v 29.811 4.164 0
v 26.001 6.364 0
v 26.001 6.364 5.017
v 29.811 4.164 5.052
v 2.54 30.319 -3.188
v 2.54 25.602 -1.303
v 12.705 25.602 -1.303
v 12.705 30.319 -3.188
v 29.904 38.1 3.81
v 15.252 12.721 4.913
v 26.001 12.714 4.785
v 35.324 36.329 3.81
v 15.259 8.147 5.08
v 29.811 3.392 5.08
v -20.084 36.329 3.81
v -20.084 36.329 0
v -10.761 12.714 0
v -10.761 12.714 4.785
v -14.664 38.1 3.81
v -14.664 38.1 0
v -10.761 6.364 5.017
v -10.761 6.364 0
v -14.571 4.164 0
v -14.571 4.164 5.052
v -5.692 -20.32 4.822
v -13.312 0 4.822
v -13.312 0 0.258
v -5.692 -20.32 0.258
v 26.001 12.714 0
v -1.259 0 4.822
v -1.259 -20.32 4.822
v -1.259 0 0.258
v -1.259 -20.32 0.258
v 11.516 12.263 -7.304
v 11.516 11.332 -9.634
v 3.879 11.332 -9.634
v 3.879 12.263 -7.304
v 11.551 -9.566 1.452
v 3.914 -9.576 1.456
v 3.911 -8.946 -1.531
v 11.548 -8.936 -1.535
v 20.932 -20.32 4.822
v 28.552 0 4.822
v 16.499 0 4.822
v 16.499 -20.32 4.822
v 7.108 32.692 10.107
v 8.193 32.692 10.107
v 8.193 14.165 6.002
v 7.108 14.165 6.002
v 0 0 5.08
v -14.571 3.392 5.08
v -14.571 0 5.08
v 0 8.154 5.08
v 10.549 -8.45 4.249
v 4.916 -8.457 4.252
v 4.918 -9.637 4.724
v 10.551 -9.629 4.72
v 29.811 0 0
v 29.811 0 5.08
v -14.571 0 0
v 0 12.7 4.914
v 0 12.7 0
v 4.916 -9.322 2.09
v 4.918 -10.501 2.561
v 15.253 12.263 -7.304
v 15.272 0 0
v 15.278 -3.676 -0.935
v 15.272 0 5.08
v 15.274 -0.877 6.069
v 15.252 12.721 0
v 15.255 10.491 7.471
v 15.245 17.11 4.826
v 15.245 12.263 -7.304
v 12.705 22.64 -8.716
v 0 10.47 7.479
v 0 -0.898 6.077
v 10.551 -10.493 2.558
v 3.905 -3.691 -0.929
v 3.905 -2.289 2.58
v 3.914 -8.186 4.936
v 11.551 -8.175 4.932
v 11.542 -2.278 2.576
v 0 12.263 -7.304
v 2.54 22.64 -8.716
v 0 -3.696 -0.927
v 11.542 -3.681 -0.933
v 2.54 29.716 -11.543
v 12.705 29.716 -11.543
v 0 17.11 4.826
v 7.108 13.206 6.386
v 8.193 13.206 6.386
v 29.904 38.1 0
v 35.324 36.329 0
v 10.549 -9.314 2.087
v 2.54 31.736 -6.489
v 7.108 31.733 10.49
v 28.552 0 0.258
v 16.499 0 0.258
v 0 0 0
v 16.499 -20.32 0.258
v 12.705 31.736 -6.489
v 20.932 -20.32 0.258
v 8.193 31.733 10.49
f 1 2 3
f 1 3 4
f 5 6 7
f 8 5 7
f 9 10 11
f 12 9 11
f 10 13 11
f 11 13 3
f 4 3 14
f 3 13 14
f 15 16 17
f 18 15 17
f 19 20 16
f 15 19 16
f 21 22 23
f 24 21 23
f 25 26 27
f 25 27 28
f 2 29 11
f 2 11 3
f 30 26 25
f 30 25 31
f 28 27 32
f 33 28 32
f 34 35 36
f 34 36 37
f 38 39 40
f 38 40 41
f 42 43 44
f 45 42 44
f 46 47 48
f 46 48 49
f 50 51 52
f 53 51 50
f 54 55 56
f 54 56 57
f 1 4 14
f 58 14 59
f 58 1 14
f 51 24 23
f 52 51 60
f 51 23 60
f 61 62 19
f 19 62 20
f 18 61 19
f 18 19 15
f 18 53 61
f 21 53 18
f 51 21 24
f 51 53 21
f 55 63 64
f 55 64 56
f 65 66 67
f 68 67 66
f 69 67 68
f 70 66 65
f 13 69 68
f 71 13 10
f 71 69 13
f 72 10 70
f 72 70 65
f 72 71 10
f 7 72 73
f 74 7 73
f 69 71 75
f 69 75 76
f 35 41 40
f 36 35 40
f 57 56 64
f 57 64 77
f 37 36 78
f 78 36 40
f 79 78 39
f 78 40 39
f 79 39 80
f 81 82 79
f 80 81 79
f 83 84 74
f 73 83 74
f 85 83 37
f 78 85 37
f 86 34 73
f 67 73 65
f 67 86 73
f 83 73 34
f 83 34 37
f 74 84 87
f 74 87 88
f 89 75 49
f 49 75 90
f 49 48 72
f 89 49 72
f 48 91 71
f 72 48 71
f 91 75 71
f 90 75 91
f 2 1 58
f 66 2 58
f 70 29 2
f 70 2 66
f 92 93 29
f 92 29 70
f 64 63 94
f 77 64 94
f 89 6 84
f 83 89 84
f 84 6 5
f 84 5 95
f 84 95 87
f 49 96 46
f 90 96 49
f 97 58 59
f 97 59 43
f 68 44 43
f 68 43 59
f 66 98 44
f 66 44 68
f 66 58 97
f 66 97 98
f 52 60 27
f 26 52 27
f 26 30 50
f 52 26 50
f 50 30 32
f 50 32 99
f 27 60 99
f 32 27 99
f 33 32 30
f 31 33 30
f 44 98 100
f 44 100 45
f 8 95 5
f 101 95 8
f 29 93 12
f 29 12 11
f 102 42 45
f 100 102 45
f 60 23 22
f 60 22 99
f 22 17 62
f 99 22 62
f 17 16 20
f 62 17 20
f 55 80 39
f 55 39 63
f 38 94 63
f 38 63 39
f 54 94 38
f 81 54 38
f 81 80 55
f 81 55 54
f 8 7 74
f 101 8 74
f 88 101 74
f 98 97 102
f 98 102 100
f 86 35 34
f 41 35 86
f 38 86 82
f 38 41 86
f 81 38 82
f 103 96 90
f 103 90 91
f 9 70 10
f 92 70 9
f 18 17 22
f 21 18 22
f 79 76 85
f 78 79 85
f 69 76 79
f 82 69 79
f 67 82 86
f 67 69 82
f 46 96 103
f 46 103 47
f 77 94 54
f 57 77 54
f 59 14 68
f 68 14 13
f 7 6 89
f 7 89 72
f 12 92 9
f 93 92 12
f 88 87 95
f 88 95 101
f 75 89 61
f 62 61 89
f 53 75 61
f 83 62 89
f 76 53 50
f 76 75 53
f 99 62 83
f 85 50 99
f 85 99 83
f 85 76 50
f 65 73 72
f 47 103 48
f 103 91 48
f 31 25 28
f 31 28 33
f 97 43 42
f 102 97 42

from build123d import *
from OCP.BRepFilletAPI import BRepFilletAPI_MakeChamfer

# Parameters (mm, degrees)
BOSS_EXTRUDE1_DEPTH  = 5.08
CHAMFER5_SIZE        = 1.27
CHAMFER5_SIZE2       = 33.019999999999996
SKETCH6_W            = 12.052934308980802
SKETCH6_H            = 4.563994413231876
BOSS_EXTRUDE2_DEPTH  = 20.32
CHAMFER6_SIZE        = 20.32
CHAMFER6_SIZE_2      = 7.62
BOSS_EXTRUDE5_DEPTH  = 19.05
CUT_EXTRUDE4_DEPTH   = 15.494
CUT_EXTRUDE5_DEPTH   = 15.494
CUT_EXTRUDE6_DEPTH   = 15.494
CUT_EXTRUDE7_DEPTH   = 15.494
CHAMFER7_SIZE        = 25.4
CHAMFER7_SIZE_2      = 13.97
CUT_EXTRUDE9_DEPTH   = 15.494
BOSS_EXTRUDE7_DEPTH  = 6.35
SKETCH24_W           = 3.7386650704626128
SKETCH24_H           = 3.778783012789209
SKETCH24_W_2         = 3.9045544155871448
SKETCH24_H_2         = 3.7787830127892117
CUT_EXTRUDE11_DEPTH  = 19.05
CHAMFER9_SIZE        = 2.54
CHAMFER9_SIZE2       = 3.8099999999999996
SKETCH26_W           = 23.370745721099873
SKETCH26_H           = 31.500943766528344
CUT_EXTRUDE14_DEPTH  = 1.2699999999999978
SKETCH27_W           = 5.63305406156012
SKETCH27_H           = 2.3288196199824216
BOSS_EXTRUDE9_DEPTH  = 1.2699999999999978
SKETCH30_W           = 1.0845533410304151
SKETCH30_H           = 1.0329414918412994
SKETCH34_W           = 15.244980385835458
SKETCH34_H           = 13.062490152383763
BOSS_EXTRUDE14_DEPTH = 10.16
CHAMFER11_SIZE       = 2.54
CHAMFER11_SIZE_2     = 10.16
SKETCH38_W           = 10.164980385835456
SKETCH38_H           = 7.9824901523837575
BOSS_EXTRUDE15_DEPTH = 7.62
CHAMFER12_SIZE       = 2.54


# Some blends are built 0.0001 mm under size
with BuildPart() as part:
    # Sketch4 → Boss-Extrude1 (new body)
    with BuildSketch(Plane.XY):
        Polygon((0, 0), (0, 12.7), (-14.664448494293428, 38.099999999999994), (-20.084228903343057, 36.328898401943476), (-10.761091691630092, 12.71368779454834), (-10.761091691630092, 6.3636877945483405), (-14.57109169163009, 4.164020520404326), (-14.57109169163009, 0), align=None)
    extrude(amount=BOSS_EXTRUDE1_DEPTH)

    # Chamfer5
    chamfer5_edges = [part.edges().sort_by_distance(p)[0] for p in [
        (-17.374338698818242, 37.214449200971735, 5.08),
    ]]
    chamfer5_side = [part.faces().sort_by_distance(p)[0] for p in [
        (-17.374338698818242, 37.214449200971735, 2.54),
    ]]
    chamfer(chamfer5_edges, length=CHAMFER5_SIZE, length2=CHAMFER5_SIZE2, reference=chamfer5_side[0])

    # Sketch6 → Boss-Extrude2 (add)
    with BuildSketch(Plane.XZ):
        with Locations((-7.2855458458150455, 2.54)):
            Rectangle(SKETCH6_W, SKETCH6_H)
    extrude(amount=BOSS_EXTRUDE2_DEPTH)

    # Chamfer6
    # the kernel refuses this chamfer: 20.32, 7.62 mm, written as the material it takes off along each edge
    with BuildSketch(Plane(origin=(-13.312013000305447, -20.32, 57.52944740394708), x_dir=(-0.013536660009854505, 0.9999083752203387, 0), z_dir=(0, 0, -1))) as chamfer6_piece_1_section:
        Polygon((CHAMFER6_SIZE * 0.99990837522, CHAMFER6_SIZE * 0.0135366600099), (-CHAMFER6_SIZE_2 * 0.0135366600099, CHAMFER6_SIZE_2 * 0.99990837522), (0, 0), align=None)
    chamfer6_piece_1 = extrude(amount=109.97889480789416, mode=Mode.PRIVATE)
    chamfer6_piece_1 = split(chamfer6_piece_1, bisect_by=Plane(origin=(-10.948471131308636, 0, 2.5400000000000014), z_dir=(0, -1, 0)), keep=Keep.TOP, mode=Mode.PRIVATE)
    add(chamfer6_piece_1, mode=Mode.SUBTRACT)


with BuildPart() as body_2:
    # Mirror8: mirrored copy
    add(part.part.mirror(Plane(origin=(7.619999999999999, 0, 0), x_dir=(0, 0, 1), z_dir=(1, 0, 0))))


with BuildPart() as part_1:
    add(part.part)

    add(body_2.part)  # Boss-Extrude5 merges body 2
    # Sketch7 → Boss-Extrude5 (add, symmetric)
    with BuildSketch(Plane(origin=(0, 0, 0), x_dir=(0, -1, 0), z_dir=(0, 0, 1))):
        Polygon((5.0986751933069705, 0), (5.0986751933069705, 15.280255393277036), (-20.245687537827482, 15.239999999999998), (-20.245687537827482, 0), align=None)
    extrude(amount=BOSS_EXTRUDE5_DEPTH, both=True)

    # Sketch13 → Cut-Extrude4 (cut)
    with BuildSketch(Plane(origin=(15.272118449240836, 0.02425727333804481, 0), x_dir=(0, 0, -1), z_dir=(0.9999987385949102, 0.0015883351625656467, 0))):
        Polygon((-19.05, 4.286246257710902), (4.496404811954787, -5.122938928746256), (-19.05, -5.122938928746256), align=None)
    extrude(amount=-CUT_EXTRUDE4_DEPTH, mode=Mode.SUBTRACT)

    # Sketch18 → Cut-Extrude5 (cut)
    with BuildSketch(Plane(origin=(0, -5.0986751933069705, 19.05), x_dir=(0, 0, -1), z_dir=(1, 0, 0))):
        Polygon((38.1, 0), (38.1, 25.344362731134453), (33.61333406805571, 25.344362731134453), (23.485668928436706, 0), align=None)
    extrude(amount=CUT_EXTRUDE5_DEPTH, mode=Mode.SUBTRACT)

    # Sketch19 → Cut-Extrude6 (cut)
    with BuildSketch(Plane.ZY):
        Polygon((12.672573032991338, 20.245687537827482), (19.05, 4.286251664410568), (19.05, 20.245687537827482), align=None)
    extrude(amount=-CUT_EXTRUDE6_DEPTH, mode=Mode.SUBTRACT)

    # Sketch20 → Cut-Extrude7 (cut)
    with BuildSketch(Plane.ZY):
        Polygon((-10.813095895445443, 10.860760680109815), (12.672573032991338, 20.245687537827482), (-14.563334068055712, 20.245687537827482), align=None)
    extrude(amount=-CUT_EXTRUDE7_DEPTH, mode=Mode.SUBTRACT)

    # Chamfer7
    # the kernel refuses this chamfer: 25.4, 13.97 mm, written as the material it takes off along each edge
    with BuildSketch(Plane(origin=(-65.73691449265259, 4.196216304667381, 19.08597833505926), x_dir=(-0.0014746788980924302, 0.9353516299299037, -0.3537162050424322), z_dir=(0.9999989122833349, 0.0013696301766686866, -0.0005473073417378643))) as chamfer7_piece_1:
        Polygon((CHAMFER7_SIZE * 0.999826618339, -CHAMFER7_SIZE * 0.018620774985), (-CHAMFER7_SIZE_2 * 0.018620774985, -CHAMFER7_SIZE_2 * 0.999826618339), (0, 0), align=None)
    extrude(amount=146.73930435250884, mode=Mode.SUBTRACT)

    # Sketch21 → Cut-Extrude9 (cut)
    with BuildSketch(Plane.ZY):
        Polygon((8.477655483236292, 18.569388919356417), (4.825777553004942, 17.110090171129713), (7.479050890335823, 10.47030489395858), align=None)
    extrude(amount=-CUT_EXTRUDE9_DEPTH, mode=Mode.SUBTRACT)

    # Sketch22 → Boss-Extrude7 (add)
    with BuildSketch(Plane(origin=(0.00455562028050382, -2.868169540906279, 1.1461270887773878), x_dir=(0.9999989122833348, 0.0013696301766686846, -0.0005473073417378687), z_dir=(0.001474934624707707, -0.9286029793832664, 0.3710718680368721))):
        Polygon((7.635563761108569, -6.010956849215719), (11.537018076990257, -6.010956849215718), (11.537018076990257, 1.5466091763627066), (3.899998790351411, 1.5466091763627066), (3.899998790351413, -6.010956849215722), align=None)
    extrude(amount=BOSS_EXTRUDE7_DEPTH)

    # Sketch24 → Cut-Extrude11 (cut)
    with BuildSketch(Plane(origin=(0.00455562028050382, -2.868169540906279, 1.1461270887773878), x_dir=(0.9999989122833348, 0.0013696301766686846, -0.0005473073417378687), z_dir=(0.001474934624707707, -0.9286029793832664, 0.3710718680368722))):
        with Locations((13.406350612221562, -4.121565342821113)):
            Rectangle(SKETCH24_W, SKETCH24_H)
        with Locations((1.9477215825578391, -4.121565342821115)):
            Rectangle(SKETCH24_W_2, SKETCH24_H_2)
    extrude(amount=-CUT_EXTRUDE11_DEPTH, mode=Mode.SUBTRACT)

    # Chamfer9
    chamfer9_edges = [part_1.edges().sort_by_distance(p)[0] for p in [
        (7.73242149326798, -10.984726370799283, -2.083589456062718),
    ]]
    chamfer9_side = [part_1.faces().sort_by_distance(p)[0] for p in [
        (7.714767768751576, -0.06198305402502739, -6.44834259236495),
    ]]
    chamfer(chamfer9_edges, length=CHAMFER9_SIZE, length2=CHAMFER9_SIZE2, reference=chamfer9_side[0])

    # Sketch26 → Cut-Extrude14 (cut)
    with BuildSketch(Plane(origin=(0, -2.23049941287892, -5.581798510541238), x_dir=(-1, 0, 0), z_dir=(0, -0.37107227165836976, -0.9286039894412996))):
        with Locations((-7.42917145975186, 4.586757393504559)):
            Rectangle(SKETCH26_W, SKETCH26_H)
    extrude(amount=-CUT_EXTRUDE14_DEPTH, mode=Mode.SUBTRACT)

    # Sketch27 → Boss-Extrude9 (add)
    with BuildSketch(Plane(origin=(0.01392145514739876, -8.76479845999002, 3.5024334508115262), x_dir=(0.9999989122833348, 0.0013696301766687824, -0.0005473073417379074), z_dir=(0.0014749346247078124, -0.9286029793832665, 0.371071868036872))):
        with Locations((7.7185084336708325, -0.353981031334653)):
            Rectangle(SKETCH27_W, SKETCH27_H)
    extrude(amount=BOSS_EXTRUDE9_DEPTH)

    # Sweep3: sweep along a path in Sketch31
    with BuildLine(Plane(origin=(7.619999999999999, -5.0986751933069705, 19.05), x_dir=(0, 0, -1), z_dir=(1, 0, 0))) as sweep3_path:
        Line((12.859063600877302, 18.79247143047996), (8.75450408234446, 37.3194963828567))
    # Sketch30 → Sweep3 (sweep)
    with BuildSketch(Plane(origin=(0, 4.018830078140977, 10.057074937909151), x_dir=(1, 0, 0), z_dir=(0, 0.3710722716583693, 0.9286039894412997))):
        with Locations((7.6507653900392825, 10.410250498608775)):
            Rectangle(SKETCH30_W, SKETCH30_H)
    sweep(path=sweep3_path.line)

    # Sketch34 → Boss-Extrude14 (add)
    with BuildSketch(Plane(origin=(0, 13.091260092988732, -5.231297384904211), x_dir=(1, 0, 0), z_dir=(0, 0.9286039894412996, -0.3710722716583697))):
        with Locations((7.622490192917729, -4.299071239765427)):
            Rectangle(SKETCH34_W, SKETCH34_H)
    extrude(amount=BOSS_EXTRUDE14_DEPTH)

    # Chamfer11
    chamfer11_edges_1 = [part_1.edges().sort_by_distance(p)[0] for p in [
        (15.244980385835458, 24.121142756673255, -5.009256960814719),
    ]]
    chamfer11_side_1 = [part_1.faces().sort_by_distance(p)[0] for p in [
        (15.194180385835457, 24.121142756673255, -5.009256960814719),
    ]]
    chamfer11_edges_2 = [part_1.edges().sort_by_distance(p)[0] for p in [
        (7.622490192917729, 21.697578809493194, -11.074197194585345),
    ]]
    chamfer11_side_2 = [part_1.faces().sort_by_distance(p)[0] for p in [
        (7.622490192917729, 21.650405726829575, -11.0553467231851),
    ]]
    chamfer11_edges_3 = [part_1.edges().sort_by_distance(p)[0] for p in [
        (0, 24.121142756673255, -5.009256960814719),
    ]]
    chamfer11_side_3 = [part_1.faces().sort_by_distance(p)[0] for p in [
        (0, 24.073969674009636, -4.9904064894144735),
    ]]
    chamfer11_edges_4 = [part_1.edges().sort_by_distance(p)[0] for p in [
        (7.622490192917729, 26.54470670385332, 1.055683272955907),
    ]]
    chamfer11_side_4 = [part_1.faces().sort_by_distance(p)[0] for p in [
        (7.622490192917729, 26.4975336211897, 1.074533744356152),
    ]]
    chamfer11 = BRepFilletAPI_MakeChamfer(part_1.part.solid().wrapped)
    for e in chamfer11_edges_1:
        chamfer11.Add(CHAMFER11_SIZE - 0.0001, CHAMFER11_SIZE_2 - 0.0001, e.wrapped, chamfer11_side_1[0].wrapped)
    for e in chamfer11_edges_2:
        chamfer11.Add(CHAMFER11_SIZE_2 - 0.0001, CHAMFER11_SIZE - 0.0001, e.wrapped, chamfer11_side_2[0].wrapped)
    for e in chamfer11_edges_3:
        chamfer11.Add(CHAMFER11_SIZE_2 - 0.0001, CHAMFER11_SIZE - 0.0001, e.wrapped, chamfer11_side_3[0].wrapped)
    for e in chamfer11_edges_4:
        chamfer11.Add(CHAMFER11_SIZE_2 - 0.0001, CHAMFER11_SIZE - 0.0001, e.wrapped, chamfer11_side_4[0].wrapped)
    add(Compound.cast(chamfer11.Shape()), mode=Mode.REPLACE)  # a hair under: the kernel refuses the full size

    # Sketch38 → Boss-Extrude15 (add)
    with BuildSketch(Plane(origin=(0, 22.525876625712346, -9.001391664953251), x_dir=(1, 0, 0), z_dir=(0, 0.9286039894412996, -0.37107227165836976))):
        with Locations((7.622490192917729, -4.299071239765427)):
            Rectangle(SKETCH38_W, SKETCH38_H)
    extrude(amount=BOSS_EXTRUDE15_DEPTH)

    # Chamfer12
    chamfer12_edges = [part_1.edges().sort_by_distance(p)[0] for p in [
        (7.622490192917728, 32.67814553338378, -4.130541570261777),
    ]]
    chamfer(chamfer12_edges, length=CHAMFER12_SIZE)


solid = part_1.part
